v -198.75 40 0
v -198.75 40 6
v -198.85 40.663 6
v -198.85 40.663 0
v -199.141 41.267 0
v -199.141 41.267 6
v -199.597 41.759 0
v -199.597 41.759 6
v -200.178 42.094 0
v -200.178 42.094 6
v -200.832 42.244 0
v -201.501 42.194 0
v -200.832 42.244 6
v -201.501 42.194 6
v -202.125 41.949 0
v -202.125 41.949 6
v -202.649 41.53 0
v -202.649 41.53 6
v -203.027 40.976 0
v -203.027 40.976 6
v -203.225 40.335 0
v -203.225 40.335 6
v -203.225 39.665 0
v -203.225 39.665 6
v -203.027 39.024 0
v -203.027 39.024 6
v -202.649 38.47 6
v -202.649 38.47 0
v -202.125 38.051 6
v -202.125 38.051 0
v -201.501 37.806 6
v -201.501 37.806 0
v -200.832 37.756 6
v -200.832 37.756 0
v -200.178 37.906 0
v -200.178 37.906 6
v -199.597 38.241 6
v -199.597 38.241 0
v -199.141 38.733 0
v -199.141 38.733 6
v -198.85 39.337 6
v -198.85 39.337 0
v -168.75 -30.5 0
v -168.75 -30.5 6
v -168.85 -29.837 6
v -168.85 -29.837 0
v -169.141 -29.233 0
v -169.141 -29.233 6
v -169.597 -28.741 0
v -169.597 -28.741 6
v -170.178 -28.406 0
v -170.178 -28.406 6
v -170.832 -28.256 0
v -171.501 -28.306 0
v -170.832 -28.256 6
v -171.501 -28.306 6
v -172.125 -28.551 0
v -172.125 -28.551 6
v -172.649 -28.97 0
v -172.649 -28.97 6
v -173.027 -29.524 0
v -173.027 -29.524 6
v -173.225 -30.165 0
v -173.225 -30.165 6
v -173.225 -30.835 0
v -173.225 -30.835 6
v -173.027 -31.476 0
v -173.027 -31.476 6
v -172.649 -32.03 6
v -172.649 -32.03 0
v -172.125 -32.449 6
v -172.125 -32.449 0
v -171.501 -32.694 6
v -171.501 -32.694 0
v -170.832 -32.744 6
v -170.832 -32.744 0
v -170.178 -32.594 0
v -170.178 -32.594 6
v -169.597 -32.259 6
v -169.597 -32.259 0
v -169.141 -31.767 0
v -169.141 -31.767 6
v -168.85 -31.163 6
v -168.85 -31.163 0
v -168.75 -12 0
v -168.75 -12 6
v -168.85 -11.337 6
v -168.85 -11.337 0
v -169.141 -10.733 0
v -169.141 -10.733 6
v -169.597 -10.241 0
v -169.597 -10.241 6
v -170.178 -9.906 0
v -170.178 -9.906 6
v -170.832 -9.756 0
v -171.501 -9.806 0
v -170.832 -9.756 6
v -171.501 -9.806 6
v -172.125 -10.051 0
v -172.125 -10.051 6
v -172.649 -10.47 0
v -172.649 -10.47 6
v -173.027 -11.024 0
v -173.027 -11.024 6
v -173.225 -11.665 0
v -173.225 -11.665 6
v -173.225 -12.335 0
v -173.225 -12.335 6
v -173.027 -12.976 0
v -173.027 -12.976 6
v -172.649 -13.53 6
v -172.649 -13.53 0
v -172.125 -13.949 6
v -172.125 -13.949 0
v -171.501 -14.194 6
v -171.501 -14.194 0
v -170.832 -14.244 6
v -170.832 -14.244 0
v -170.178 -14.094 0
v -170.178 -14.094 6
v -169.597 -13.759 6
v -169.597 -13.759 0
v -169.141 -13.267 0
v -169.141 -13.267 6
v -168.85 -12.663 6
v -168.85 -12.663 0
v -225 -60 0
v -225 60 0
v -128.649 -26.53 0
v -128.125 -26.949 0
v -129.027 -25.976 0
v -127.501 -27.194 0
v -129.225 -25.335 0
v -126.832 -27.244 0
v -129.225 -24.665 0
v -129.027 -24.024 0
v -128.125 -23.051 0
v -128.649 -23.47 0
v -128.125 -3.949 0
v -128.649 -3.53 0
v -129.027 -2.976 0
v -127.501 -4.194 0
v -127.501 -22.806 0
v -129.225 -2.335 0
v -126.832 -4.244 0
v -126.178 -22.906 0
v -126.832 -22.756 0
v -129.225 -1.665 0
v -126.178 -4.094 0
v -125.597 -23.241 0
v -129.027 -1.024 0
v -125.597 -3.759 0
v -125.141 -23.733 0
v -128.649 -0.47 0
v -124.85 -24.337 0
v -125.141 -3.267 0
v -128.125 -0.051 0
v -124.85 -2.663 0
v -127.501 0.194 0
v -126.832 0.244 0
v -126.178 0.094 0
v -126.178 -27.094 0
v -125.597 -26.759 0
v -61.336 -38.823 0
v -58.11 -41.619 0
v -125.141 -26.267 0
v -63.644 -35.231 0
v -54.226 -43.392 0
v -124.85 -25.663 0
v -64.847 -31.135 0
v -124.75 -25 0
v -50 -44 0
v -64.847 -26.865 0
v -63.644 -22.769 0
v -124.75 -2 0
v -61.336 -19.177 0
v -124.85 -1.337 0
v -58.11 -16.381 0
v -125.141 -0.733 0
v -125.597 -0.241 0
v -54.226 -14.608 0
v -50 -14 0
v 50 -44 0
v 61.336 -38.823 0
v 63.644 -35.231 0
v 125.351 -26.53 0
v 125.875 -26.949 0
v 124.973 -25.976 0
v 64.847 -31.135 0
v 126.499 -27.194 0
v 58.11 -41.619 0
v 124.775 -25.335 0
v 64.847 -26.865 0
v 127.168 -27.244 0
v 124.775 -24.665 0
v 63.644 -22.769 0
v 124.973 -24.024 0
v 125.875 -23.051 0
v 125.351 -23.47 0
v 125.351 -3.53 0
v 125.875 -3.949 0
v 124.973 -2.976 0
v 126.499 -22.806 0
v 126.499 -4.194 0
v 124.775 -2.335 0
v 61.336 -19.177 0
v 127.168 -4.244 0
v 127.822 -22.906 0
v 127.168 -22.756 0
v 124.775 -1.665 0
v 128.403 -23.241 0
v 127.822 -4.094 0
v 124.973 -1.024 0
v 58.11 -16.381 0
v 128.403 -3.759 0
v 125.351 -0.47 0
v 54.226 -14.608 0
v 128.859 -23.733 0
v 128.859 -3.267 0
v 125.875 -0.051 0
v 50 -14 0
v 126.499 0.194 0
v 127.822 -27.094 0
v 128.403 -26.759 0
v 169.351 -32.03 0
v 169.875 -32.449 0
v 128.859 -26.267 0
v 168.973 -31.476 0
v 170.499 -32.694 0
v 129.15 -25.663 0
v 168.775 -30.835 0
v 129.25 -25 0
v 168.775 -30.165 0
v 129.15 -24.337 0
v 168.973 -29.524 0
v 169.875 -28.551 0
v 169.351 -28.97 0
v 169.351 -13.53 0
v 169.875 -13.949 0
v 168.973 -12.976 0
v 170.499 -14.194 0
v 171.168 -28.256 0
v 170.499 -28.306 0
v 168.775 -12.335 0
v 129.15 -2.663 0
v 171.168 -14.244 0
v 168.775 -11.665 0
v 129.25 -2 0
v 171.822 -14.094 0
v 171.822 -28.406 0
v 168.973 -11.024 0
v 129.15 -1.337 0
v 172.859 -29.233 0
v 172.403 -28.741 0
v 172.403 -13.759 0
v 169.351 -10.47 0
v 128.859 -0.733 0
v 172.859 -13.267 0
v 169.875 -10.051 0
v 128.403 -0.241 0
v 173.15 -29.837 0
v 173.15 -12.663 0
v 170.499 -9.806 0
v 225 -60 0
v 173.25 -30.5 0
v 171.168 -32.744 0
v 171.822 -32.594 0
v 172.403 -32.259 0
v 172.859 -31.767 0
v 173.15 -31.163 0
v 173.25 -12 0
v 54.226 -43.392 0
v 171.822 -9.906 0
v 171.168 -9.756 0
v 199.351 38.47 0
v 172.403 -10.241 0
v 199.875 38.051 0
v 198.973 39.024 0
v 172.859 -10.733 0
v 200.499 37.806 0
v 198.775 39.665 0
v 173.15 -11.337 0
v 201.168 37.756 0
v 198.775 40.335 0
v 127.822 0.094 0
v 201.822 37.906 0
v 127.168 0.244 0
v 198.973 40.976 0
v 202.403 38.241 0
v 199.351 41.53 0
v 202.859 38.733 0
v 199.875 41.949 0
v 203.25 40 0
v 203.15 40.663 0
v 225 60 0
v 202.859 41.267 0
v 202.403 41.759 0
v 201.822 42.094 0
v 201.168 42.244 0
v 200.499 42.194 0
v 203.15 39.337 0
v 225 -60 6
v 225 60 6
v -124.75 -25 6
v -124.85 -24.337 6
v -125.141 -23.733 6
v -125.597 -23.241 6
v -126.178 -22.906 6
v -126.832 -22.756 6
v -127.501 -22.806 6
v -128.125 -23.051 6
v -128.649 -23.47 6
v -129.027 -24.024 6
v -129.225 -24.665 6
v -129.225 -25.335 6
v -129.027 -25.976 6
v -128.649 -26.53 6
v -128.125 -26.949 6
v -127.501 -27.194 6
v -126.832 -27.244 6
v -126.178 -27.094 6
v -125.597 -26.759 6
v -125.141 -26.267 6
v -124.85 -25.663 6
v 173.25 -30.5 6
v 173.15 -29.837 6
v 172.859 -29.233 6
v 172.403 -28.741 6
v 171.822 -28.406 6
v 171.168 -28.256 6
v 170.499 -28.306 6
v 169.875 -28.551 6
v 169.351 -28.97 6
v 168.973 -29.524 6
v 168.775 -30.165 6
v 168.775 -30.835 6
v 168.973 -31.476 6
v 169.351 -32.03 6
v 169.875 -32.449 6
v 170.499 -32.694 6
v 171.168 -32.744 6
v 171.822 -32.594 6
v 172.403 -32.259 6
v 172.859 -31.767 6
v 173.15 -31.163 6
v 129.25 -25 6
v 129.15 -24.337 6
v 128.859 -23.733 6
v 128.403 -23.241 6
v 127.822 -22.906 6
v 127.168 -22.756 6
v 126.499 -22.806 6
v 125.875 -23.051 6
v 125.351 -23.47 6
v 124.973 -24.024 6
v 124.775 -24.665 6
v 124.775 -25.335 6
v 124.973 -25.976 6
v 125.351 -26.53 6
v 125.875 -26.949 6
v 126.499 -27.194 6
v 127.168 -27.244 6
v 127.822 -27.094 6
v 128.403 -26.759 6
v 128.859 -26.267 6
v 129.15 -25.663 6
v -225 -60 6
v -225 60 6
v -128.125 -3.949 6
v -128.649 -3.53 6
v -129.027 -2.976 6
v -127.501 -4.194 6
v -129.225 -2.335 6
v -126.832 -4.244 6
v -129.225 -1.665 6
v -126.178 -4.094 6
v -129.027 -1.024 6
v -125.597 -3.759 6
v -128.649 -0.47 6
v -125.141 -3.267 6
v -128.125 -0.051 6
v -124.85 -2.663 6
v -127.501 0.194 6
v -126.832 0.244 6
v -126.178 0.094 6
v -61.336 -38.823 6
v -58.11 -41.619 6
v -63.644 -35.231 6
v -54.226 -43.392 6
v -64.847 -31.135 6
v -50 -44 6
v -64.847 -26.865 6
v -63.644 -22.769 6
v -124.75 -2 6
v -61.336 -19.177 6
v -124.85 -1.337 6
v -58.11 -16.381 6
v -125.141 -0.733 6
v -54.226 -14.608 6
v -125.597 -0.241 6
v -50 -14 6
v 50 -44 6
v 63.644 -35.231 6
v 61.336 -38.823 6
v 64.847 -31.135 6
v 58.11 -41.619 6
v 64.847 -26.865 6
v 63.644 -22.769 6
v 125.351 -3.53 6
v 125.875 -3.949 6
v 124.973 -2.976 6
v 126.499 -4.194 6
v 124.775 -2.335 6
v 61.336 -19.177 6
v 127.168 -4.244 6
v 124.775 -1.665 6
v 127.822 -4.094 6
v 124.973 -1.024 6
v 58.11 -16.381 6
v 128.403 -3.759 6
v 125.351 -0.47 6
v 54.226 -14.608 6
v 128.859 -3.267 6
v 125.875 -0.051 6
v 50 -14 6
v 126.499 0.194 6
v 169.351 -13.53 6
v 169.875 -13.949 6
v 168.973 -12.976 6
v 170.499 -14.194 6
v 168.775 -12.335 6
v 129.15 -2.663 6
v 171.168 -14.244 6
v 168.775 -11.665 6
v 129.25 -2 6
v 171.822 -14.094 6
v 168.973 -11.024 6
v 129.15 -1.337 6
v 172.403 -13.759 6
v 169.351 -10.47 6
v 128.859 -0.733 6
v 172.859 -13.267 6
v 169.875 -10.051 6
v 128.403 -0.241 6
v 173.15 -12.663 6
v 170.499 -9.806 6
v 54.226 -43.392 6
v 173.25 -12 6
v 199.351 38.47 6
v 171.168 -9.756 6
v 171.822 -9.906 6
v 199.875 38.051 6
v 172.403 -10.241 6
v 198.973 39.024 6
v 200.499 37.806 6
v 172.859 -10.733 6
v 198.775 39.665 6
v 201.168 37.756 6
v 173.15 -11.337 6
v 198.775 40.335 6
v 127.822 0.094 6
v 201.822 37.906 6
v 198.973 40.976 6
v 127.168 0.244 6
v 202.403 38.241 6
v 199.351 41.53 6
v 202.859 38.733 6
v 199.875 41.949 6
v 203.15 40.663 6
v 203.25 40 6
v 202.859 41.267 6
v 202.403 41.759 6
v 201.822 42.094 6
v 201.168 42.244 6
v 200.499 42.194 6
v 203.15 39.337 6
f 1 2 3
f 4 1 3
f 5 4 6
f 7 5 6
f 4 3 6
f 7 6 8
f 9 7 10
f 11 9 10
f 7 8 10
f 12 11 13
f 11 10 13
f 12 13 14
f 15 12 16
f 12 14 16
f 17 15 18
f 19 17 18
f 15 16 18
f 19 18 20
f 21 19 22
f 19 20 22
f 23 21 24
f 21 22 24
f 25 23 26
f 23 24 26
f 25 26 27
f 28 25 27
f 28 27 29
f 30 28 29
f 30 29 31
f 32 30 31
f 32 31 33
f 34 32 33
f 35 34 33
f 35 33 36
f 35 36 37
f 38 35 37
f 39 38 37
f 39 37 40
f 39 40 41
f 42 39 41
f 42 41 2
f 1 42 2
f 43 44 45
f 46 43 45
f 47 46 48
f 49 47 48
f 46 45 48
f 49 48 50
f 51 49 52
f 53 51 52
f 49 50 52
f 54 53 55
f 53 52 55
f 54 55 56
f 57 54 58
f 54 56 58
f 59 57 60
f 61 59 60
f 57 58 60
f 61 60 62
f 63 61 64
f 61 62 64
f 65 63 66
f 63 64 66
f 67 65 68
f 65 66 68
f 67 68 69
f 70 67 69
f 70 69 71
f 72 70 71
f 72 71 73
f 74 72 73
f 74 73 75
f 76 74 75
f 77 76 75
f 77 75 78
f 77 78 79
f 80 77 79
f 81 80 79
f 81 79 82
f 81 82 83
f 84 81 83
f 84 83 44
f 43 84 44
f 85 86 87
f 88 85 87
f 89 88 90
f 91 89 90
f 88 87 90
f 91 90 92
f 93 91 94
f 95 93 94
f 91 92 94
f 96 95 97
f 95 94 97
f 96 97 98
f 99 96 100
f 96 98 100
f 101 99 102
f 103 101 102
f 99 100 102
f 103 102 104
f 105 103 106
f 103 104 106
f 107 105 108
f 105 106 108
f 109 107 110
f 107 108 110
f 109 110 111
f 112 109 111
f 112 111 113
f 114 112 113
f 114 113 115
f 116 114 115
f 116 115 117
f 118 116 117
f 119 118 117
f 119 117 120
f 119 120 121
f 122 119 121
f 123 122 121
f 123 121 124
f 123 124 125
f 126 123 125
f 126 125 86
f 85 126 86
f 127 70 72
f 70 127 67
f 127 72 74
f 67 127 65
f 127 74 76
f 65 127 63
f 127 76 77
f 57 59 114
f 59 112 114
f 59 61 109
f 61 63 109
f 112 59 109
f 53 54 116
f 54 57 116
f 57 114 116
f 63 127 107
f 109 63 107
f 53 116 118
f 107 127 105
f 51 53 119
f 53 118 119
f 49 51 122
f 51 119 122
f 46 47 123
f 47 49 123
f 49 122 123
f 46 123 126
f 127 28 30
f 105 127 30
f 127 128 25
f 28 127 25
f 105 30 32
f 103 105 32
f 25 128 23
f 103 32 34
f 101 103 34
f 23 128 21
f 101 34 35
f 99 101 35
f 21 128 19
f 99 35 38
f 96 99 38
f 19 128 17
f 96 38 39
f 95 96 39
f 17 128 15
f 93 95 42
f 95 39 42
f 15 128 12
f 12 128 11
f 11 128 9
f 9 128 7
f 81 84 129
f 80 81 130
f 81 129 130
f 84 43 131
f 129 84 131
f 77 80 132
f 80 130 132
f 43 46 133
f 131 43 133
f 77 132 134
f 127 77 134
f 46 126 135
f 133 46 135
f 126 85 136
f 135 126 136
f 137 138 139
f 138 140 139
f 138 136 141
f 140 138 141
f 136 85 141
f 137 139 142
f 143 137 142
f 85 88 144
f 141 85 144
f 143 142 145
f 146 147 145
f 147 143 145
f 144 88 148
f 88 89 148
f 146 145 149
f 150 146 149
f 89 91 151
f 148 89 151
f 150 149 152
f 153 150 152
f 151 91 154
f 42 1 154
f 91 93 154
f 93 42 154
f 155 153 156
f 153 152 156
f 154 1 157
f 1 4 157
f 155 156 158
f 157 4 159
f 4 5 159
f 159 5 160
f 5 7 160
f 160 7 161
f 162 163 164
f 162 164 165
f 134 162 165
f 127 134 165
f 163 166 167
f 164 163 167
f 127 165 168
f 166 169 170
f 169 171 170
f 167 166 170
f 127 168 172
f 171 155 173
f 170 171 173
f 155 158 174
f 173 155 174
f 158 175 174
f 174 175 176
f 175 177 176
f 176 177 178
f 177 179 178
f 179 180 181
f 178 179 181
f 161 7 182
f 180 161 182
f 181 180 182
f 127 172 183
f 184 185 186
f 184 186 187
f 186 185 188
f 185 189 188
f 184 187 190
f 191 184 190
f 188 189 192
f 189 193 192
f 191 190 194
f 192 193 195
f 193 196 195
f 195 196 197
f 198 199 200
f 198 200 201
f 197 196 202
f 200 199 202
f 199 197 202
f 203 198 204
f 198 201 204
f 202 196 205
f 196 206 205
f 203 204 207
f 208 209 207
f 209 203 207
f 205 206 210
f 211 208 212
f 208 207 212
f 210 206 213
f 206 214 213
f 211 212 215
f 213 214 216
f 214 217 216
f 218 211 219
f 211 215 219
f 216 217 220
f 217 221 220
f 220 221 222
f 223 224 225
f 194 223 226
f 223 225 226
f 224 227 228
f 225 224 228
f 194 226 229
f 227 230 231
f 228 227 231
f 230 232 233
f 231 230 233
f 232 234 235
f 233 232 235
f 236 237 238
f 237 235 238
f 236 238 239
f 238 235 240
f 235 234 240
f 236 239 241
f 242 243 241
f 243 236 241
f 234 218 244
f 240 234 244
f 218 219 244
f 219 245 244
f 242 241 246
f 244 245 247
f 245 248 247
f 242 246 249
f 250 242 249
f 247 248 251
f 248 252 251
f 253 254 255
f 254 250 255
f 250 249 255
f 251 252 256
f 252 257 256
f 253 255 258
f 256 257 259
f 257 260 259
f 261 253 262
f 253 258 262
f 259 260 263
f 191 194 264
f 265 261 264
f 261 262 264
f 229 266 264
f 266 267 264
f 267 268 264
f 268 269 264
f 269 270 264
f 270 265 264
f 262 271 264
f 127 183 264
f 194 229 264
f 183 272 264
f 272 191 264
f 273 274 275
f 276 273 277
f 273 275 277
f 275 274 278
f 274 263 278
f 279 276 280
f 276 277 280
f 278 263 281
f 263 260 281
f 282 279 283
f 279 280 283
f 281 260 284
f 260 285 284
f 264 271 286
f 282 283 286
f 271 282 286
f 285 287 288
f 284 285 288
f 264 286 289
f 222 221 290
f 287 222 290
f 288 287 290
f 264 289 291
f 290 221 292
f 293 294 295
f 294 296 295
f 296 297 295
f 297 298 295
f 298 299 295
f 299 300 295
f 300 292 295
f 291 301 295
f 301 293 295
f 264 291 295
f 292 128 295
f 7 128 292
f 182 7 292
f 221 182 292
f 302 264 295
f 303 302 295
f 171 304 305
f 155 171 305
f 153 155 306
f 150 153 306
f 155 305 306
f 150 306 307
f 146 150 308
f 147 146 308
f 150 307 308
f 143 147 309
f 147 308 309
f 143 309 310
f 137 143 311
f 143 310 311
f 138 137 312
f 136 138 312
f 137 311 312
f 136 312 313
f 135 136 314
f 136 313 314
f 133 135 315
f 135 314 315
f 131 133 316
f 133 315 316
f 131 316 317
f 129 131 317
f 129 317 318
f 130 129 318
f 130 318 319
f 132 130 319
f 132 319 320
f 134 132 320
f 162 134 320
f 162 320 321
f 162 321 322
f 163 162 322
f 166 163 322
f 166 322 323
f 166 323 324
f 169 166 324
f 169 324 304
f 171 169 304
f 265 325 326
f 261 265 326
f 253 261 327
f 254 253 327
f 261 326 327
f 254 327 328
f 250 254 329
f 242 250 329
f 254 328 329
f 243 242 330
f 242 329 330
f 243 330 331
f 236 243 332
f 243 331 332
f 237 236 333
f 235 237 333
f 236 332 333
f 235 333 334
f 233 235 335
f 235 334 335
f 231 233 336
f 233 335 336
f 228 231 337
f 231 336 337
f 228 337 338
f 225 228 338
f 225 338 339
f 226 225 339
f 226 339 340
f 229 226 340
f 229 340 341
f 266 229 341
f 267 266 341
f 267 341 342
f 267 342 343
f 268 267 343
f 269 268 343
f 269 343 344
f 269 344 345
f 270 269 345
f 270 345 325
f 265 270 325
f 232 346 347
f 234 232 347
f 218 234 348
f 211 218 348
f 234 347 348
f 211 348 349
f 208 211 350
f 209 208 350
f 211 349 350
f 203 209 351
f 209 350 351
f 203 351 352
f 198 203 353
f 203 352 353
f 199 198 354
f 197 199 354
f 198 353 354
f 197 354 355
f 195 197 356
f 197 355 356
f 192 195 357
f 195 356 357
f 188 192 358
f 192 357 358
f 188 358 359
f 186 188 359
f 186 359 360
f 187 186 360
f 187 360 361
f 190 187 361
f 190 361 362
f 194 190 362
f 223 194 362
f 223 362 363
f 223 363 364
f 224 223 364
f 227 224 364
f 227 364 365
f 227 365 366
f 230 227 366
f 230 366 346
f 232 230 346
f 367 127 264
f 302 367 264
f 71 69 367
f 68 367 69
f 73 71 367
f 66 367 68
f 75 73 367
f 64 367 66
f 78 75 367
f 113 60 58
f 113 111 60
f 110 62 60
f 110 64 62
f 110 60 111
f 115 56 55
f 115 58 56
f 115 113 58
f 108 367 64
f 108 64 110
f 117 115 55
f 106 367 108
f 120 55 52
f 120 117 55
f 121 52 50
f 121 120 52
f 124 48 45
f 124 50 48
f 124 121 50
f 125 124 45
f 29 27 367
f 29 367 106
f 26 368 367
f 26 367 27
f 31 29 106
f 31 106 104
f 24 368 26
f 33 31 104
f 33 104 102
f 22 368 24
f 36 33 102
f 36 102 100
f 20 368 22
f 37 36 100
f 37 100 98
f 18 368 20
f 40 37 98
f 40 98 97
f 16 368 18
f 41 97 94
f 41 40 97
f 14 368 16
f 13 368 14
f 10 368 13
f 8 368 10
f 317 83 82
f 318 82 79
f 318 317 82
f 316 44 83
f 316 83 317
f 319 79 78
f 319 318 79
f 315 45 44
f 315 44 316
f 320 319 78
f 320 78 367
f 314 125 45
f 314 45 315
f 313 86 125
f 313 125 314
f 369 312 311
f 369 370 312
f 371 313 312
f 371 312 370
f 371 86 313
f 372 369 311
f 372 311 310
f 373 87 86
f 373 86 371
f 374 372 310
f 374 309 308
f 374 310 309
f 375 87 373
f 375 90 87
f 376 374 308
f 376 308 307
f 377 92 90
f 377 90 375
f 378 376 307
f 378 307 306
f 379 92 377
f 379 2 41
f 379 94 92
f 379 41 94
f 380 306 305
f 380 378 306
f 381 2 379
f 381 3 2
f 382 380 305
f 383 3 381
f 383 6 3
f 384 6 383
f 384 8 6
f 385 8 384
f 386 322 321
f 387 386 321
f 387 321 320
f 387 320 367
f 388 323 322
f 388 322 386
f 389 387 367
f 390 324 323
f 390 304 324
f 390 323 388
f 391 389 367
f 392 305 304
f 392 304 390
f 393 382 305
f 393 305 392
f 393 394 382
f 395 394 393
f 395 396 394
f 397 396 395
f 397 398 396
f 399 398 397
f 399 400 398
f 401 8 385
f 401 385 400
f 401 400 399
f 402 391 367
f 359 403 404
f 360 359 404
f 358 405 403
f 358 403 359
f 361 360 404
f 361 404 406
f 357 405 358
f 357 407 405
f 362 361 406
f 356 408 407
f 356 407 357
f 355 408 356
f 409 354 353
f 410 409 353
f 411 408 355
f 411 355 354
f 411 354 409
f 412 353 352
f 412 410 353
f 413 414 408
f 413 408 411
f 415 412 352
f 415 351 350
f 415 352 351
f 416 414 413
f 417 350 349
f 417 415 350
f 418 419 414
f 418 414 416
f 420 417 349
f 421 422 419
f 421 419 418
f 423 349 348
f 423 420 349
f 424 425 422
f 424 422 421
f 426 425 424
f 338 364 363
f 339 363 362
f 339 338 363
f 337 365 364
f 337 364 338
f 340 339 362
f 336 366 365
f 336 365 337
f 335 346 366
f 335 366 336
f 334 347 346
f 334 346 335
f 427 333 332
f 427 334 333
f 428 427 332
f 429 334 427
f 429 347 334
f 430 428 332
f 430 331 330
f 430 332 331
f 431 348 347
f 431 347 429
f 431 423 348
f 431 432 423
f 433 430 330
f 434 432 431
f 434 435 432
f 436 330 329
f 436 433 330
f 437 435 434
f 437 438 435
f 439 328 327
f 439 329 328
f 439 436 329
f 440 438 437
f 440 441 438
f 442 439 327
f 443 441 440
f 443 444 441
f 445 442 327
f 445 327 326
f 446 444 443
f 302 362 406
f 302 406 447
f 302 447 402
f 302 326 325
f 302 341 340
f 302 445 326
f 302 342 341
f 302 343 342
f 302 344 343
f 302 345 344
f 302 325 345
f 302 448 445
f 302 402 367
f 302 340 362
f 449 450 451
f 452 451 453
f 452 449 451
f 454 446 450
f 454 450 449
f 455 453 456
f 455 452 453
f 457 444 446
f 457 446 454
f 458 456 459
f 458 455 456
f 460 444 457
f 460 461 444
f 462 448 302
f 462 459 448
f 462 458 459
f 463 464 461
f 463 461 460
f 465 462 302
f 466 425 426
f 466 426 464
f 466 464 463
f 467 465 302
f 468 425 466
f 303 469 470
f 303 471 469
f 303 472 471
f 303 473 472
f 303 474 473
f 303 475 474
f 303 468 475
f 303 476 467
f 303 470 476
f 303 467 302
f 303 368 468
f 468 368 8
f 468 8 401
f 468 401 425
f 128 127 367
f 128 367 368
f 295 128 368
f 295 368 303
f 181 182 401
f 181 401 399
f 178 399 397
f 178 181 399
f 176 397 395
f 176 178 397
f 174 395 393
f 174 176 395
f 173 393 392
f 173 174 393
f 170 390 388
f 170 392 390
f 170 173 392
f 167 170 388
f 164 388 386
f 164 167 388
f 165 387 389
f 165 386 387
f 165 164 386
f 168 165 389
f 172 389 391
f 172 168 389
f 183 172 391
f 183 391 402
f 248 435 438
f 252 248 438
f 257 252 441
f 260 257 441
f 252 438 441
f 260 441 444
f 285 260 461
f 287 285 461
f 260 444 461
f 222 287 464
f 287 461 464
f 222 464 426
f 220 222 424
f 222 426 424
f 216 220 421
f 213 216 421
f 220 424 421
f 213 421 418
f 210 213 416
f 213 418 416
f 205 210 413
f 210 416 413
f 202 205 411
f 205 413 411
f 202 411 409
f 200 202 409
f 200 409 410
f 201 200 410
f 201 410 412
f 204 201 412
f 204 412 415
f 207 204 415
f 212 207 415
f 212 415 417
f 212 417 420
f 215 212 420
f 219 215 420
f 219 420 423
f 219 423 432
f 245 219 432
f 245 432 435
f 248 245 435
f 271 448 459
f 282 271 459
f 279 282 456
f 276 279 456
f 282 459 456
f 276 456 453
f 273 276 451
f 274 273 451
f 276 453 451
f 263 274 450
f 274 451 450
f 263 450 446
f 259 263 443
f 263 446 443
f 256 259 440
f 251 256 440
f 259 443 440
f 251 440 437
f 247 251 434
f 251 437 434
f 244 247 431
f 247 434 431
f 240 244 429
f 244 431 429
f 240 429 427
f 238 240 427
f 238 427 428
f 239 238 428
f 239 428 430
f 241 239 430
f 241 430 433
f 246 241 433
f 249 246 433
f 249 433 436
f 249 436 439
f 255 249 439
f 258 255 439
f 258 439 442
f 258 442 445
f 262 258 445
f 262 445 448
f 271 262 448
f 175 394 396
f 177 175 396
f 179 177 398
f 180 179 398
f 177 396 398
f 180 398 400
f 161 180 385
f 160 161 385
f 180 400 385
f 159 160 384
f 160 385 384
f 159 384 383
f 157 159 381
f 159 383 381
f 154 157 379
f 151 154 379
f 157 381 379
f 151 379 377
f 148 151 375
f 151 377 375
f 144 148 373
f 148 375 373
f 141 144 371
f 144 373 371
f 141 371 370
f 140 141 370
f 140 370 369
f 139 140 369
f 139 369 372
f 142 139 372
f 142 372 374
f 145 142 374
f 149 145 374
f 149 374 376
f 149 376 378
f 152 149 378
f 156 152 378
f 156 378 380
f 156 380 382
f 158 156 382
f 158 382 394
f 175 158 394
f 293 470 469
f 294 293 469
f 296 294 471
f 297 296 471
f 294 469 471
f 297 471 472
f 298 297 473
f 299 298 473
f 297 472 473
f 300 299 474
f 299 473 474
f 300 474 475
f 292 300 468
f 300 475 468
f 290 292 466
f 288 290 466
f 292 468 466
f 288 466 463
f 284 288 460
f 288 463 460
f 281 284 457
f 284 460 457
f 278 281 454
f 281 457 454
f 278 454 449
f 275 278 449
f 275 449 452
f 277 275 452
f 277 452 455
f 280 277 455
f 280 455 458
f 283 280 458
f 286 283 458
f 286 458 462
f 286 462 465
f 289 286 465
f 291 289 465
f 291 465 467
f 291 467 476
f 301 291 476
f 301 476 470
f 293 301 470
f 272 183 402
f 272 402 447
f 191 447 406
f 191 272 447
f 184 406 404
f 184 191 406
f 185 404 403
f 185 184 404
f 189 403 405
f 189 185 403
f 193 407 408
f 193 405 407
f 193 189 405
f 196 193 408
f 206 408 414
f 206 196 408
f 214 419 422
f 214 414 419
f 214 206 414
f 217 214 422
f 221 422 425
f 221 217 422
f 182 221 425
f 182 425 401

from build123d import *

# Parameters (mm, degrees)
SCHIZZO1_W                   = 450
SCHIZZO1_H                   = 120
ESTRUSIONE_ESTRUSIONE1_DEPTH = 6
TAGLIO_ESTRUSIONE1_DEPTH     = 10
SCHIZZO3_R                   = 2.25
TAGLIO_ESTRUSIONE2_DEPTH     = 10


with BuildPart() as part:
    # Schizzo1 → Estrusione-Estrusione1 (new body)
    with BuildSketch(Plane.XY):
        Rectangle(SCHIZZO1_W, SCHIZZO1_H)
    extrude(amount=ESTRUSIONE_ESTRUSIONE1_DEPTH)

    # Schizzo2 → Taglio-Estrusione1 (cut)
    with BuildSketch(Plane(origin=(0, 0, 0), x_dir=(-1, 0, 0), z_dir=(0, 0, -1))):
        with BuildLine():
            Line((-50, -14), (50, -14))
            ThreePointArc((50, -14), (65, -29), (50, -44))
            Line((50, -44), (-50, -44))
            ThreePointArc((-50, -44), (-65, -29), (-50, -14))
        make_face()
    extrude(amount=-TAGLIO_ESTRUSIONE1_DEPTH, mode=Mode.SUBTRACT)

    # Schizzo3 → Taglio-Estrusione2 (cut)
    with BuildSketch(Plane.XY.offset(6)):
        with Locations((-171, -12)):
            Circle(SCHIZZO3_R)
        with Locations((-171, -30.5)):
            Circle(SCHIZZO3_R)
        with Locations((171, -12)):
            Circle(SCHIZZO3_R)
        with Locations((171, -30.5)):
            Circle(SCHIZZO3_R)
        with Locations((201, 40)):
            Circle(SCHIZZO3_R)
        with Locations((-201, 40)):
            Circle(SCHIZZO3_R)
        with Locations((127, -2)):
            Circle(SCHIZZO3_R)
        with Locations((127, -25)):
            Circle(SCHIZZO3_R)
        with Locations((-127, -2)):
            Circle(SCHIZZO3_R)
        with Locations((-127, -25)):
            Circle(SCHIZZO3_R)
    extrude(amount=-TAGLIO_ESTRUSIONE2_DEPTH, mode=Mode.SUBTRACT)


solid = part.part
